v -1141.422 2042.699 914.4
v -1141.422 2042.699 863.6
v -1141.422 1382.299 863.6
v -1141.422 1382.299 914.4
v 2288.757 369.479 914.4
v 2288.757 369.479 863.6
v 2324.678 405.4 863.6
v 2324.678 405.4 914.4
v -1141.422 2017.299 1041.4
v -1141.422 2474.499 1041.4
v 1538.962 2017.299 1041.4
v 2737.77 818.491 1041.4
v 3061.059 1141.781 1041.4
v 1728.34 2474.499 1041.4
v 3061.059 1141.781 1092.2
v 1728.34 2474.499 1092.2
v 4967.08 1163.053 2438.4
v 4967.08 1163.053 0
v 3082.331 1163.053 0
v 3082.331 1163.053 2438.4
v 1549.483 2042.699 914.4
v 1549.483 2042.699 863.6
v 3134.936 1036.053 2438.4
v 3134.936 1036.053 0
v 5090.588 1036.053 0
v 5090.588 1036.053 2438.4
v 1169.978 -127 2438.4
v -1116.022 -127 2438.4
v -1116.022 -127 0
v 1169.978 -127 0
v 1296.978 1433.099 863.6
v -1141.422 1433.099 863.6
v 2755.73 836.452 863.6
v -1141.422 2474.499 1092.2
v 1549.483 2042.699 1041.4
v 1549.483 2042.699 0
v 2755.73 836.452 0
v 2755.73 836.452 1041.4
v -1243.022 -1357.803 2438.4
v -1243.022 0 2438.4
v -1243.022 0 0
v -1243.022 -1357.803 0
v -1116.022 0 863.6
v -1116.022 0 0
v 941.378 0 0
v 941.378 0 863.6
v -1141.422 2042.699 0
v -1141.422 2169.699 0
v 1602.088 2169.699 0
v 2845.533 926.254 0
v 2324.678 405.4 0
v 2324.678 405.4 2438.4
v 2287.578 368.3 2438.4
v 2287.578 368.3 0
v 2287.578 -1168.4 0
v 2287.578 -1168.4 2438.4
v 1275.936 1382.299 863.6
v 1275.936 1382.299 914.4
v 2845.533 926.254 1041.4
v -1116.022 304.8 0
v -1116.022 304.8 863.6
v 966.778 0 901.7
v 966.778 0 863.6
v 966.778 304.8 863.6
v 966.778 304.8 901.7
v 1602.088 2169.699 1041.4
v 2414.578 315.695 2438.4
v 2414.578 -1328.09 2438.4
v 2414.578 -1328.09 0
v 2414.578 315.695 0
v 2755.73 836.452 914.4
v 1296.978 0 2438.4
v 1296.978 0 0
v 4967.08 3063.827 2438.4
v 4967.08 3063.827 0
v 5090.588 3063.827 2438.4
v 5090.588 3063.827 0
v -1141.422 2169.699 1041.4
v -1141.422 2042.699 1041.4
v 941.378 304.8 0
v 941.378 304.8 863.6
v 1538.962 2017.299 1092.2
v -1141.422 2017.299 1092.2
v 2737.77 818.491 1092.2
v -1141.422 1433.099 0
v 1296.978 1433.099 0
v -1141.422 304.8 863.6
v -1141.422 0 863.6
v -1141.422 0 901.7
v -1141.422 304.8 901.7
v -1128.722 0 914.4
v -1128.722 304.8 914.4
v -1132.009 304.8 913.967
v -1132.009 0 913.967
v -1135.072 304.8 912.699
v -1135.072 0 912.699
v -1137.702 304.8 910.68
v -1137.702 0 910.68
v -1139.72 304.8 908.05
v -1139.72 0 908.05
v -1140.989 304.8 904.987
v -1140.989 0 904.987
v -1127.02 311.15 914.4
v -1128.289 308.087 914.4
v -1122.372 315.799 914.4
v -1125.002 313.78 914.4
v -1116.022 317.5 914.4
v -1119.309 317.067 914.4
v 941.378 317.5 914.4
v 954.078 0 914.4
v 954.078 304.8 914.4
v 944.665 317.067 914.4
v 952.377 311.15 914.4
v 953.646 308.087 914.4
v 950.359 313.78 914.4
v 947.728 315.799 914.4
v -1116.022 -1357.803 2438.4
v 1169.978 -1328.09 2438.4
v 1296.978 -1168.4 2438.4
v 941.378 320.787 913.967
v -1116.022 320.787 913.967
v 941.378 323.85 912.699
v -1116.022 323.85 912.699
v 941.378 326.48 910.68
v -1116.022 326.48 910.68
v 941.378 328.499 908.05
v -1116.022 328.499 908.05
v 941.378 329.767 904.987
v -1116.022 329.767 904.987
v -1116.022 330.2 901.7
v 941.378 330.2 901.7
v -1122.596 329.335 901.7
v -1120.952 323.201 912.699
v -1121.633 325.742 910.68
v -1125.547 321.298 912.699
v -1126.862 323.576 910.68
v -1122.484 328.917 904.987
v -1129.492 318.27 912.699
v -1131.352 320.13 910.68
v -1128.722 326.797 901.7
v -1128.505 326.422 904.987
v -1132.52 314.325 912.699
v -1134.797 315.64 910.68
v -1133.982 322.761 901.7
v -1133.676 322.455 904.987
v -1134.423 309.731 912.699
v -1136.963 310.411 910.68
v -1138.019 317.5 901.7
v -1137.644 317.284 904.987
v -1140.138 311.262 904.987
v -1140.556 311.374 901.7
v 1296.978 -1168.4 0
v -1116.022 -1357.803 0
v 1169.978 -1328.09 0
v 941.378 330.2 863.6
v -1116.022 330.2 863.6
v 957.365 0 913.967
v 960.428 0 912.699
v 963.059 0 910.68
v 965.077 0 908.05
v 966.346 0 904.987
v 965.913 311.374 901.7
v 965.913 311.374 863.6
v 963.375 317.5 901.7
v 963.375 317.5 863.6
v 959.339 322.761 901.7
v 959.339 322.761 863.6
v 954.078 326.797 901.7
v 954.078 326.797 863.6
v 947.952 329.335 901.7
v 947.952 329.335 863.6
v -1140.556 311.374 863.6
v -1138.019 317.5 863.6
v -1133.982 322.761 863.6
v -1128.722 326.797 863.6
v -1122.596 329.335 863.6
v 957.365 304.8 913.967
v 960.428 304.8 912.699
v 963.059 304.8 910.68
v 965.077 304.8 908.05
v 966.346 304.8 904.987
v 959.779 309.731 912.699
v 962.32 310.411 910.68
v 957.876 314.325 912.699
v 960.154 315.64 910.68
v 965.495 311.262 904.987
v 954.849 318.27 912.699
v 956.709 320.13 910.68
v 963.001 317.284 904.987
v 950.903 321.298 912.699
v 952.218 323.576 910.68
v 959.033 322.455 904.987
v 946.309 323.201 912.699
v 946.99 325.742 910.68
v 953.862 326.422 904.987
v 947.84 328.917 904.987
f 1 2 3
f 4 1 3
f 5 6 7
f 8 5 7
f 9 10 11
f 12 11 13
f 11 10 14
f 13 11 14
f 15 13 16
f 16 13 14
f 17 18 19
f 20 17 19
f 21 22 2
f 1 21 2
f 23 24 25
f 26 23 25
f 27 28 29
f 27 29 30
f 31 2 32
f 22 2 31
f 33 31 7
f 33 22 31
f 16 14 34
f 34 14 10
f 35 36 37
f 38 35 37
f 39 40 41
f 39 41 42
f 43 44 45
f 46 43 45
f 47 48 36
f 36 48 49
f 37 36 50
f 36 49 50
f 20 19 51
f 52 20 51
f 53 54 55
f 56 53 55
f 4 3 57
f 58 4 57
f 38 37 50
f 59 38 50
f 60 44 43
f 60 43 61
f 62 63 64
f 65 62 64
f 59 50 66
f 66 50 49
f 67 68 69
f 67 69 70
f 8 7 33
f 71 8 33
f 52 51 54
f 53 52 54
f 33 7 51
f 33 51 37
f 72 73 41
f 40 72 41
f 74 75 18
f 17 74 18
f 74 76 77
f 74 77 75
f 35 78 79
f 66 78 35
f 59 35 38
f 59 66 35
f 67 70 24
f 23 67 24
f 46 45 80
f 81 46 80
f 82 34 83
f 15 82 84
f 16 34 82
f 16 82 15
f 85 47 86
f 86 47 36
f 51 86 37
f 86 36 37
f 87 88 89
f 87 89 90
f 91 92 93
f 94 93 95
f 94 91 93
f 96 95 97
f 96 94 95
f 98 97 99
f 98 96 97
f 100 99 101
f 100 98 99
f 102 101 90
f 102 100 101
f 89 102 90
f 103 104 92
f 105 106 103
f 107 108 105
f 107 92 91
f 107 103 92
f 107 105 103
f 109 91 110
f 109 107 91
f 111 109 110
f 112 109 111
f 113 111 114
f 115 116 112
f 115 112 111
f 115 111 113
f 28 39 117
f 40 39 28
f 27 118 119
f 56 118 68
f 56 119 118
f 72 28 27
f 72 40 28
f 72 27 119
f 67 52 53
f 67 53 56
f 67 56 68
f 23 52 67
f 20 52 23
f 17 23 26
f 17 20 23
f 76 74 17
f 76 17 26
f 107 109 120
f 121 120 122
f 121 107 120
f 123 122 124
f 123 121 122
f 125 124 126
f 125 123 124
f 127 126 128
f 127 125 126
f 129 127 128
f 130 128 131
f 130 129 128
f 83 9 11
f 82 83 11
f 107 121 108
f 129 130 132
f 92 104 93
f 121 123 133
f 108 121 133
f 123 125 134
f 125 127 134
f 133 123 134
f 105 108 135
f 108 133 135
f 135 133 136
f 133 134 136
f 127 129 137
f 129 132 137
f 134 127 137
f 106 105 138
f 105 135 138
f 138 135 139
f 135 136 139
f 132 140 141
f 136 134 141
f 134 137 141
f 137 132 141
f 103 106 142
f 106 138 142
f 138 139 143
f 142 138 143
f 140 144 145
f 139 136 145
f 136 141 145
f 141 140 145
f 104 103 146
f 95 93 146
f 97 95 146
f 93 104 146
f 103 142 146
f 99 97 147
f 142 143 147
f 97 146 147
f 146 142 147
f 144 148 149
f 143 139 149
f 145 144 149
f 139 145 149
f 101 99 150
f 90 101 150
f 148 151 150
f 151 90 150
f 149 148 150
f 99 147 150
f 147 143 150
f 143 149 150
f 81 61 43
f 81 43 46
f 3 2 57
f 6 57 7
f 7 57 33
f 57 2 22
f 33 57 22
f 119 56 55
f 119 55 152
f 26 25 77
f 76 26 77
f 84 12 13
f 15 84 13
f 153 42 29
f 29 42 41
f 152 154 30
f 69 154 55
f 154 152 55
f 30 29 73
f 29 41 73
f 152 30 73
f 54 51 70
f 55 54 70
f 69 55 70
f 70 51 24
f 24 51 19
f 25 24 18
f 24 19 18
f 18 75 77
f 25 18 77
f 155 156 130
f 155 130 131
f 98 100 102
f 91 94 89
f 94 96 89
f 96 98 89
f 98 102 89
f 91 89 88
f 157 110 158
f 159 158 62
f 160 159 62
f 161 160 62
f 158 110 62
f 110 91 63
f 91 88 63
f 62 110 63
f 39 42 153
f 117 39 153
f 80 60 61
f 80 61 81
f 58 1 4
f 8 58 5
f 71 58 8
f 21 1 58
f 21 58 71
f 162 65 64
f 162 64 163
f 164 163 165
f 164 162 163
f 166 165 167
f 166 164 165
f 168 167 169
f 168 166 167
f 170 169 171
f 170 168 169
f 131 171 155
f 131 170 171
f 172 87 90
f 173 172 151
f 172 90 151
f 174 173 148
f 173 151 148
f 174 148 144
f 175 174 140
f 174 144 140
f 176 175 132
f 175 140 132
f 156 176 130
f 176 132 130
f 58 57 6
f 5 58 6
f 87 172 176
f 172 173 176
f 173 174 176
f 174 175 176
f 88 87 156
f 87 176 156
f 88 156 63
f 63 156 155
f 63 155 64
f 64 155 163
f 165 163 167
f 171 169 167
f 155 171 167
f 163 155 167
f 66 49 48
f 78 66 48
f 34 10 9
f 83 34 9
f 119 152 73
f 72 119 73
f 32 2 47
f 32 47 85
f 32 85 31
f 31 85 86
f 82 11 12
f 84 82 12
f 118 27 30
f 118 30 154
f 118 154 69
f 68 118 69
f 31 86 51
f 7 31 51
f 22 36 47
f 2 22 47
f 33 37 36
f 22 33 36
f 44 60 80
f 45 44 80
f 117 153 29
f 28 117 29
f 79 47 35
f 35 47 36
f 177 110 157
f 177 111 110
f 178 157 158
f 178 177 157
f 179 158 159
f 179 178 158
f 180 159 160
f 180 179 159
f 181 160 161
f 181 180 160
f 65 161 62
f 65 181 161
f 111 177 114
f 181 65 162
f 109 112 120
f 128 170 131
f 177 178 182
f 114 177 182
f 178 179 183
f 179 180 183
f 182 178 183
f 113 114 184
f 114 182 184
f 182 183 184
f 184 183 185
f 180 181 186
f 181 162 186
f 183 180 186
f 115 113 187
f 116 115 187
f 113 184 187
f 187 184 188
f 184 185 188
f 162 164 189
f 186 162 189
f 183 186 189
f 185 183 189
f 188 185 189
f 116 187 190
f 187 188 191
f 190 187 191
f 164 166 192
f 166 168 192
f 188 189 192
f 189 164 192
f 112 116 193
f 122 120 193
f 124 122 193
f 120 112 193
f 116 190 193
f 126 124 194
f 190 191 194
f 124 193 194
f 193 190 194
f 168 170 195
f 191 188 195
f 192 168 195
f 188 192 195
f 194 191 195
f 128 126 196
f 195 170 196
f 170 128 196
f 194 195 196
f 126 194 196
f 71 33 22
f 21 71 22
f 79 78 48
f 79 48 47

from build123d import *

# Parameters (mm, degrees)
F1_DEPTH = 863.6
F0_W     = 2057.4
F0_H     = 304.8
F2_DEPTH = 2438.4
F3_DEPTH = 1041.4
F5_DEPTH = 50.8
F6_W     = 2108.2
F6_H     = 330.2
F7_DEPTH = 50.8
F8_R     = 25.4
F9_R     = 12.7


with BuildPart() as f1:
    # F0 (on Top) → F1 (new body)
    with BuildSketch(Plane.XY):
        Polygon((1296.9782733917, 1433.0991125107), (2324.6778296471, 405.3995562553), (2755.7301234584, 836.4518500667), (1549.4828610144, 2042.6991125107), (-1141.4217266083, 2042.6991125107), (-1141.4217266083, 1433.0991125107), align=None)
    extrude(amount=F1_DEPTH)


with BuildPart() as f1b:
    # F0 (on Top) → F1, piece 2 (new body)
    with BuildSketch(Plane.XY):
        with Locations((-87.3217266083, 152.4)):
            Rectangle(F0_W, F0_H)
    extrude(amount=F1_DEPTH)


with BuildPart() as f2:
    # F0 (on Top) → F2 (new body)
    with BuildSketch(Plane.XY):
        Polygon((-1116.0217266083, 0), (-1243.0217266083, 0), (-1243.0217266083, -1357.8029119428), (-1116.0217266083, -1357.8029119428), (-1116.0217266083, -127), (1169.9782733917, -127), (1169.9782733917, -1328.09007782), (2414.5782733917, -1328.09007782), (2414.5782733917, 315.6948775786), (3134.9360625277, 1036.0526667146), (5090.587792672, 1036.0526667146), (5090.587792672, 3063.8273026744), (4967.0795944628, 3063.8273026744), (4967.0795944628, 1163.0526667146), (3082.3309401063, 1163.0526667146), (3061.0588315747, 1141.780558183), (2845.5326846691, 926.2544112774), (2755.7301234584, 836.4518500667), (2324.6778296471, 405.3995562553), (2287.5782733917, 368.3), (2287.5782733917, -1168.4), (1296.9782733917, -1168.4), (1296.9782733917, 0), (941.3782733917, 0), align=None)
    extrude(amount=F2_DEPTH)


with BuildPart() as f3:
    # F0 (on Top) → F3 (new body)
    with BuildSketch(Plane.XY):
        Polygon((1549.4828610144, 2042.6991125107), (2755.7301234584, 836.4518500667), (2845.5326846691, 926.2544112774), (1602.0879834357, 2169.6991125107), (-1141.4217266083, 2169.6991125107), (-1141.4217266083, 2042.6991125107), align=None)
    extrude(amount=F3_DEPTH)


with BuildPart() as f5:
    # F4 (on face) → F5 (new body)
    with BuildSketch(Plane.XY.offset(1041.4)):
        Polygon((1538.9618365301, 2017.2991125107), (2737.7696112162, 818.4913378245), (3061.0588315747, 1141.780558183), (1728.3402772471, 2474.4991125107), (-1141.4217266083, 2474.4991125107), (-1141.4217266083, 2017.2991125107), align=None)
    extrude(amount=F5_DEPTH)


with BuildPart() as f7:
    # F6 (on face) → F7 (new body)
    with BuildSketch(Plane.XY.offset(863.6)):
        with Locations((-87.3217266083, 165.1)):
            Rectangle(F6_W, F6_H)
    extrude(amount=F7_DEPTH)

    # F8
    f8_edges = [f7.edges().sort_by_distance(p)[0] for p in [
        (-1141.421727, 330.2, 889),
        (966.778273, 330.2, 889),
    ]]
    fillet(f8_edges, radius=F8_R)

    # F9
    f9_edges = [f7.edges().sort_by_distance(p)[0] for p in [
        (966.778273, 152.4, 914.4),
        (-87.321727, 330.2, 914.4),
    ]]
    fillet(f9_edges, radius=F9_R)


with BuildPart() as f7b:
    # F6 (on face) → F7, piece 2 (new body)
    with BuildSketch(Plane.XY.offset(863.6)):
        Polygon((2324.6778296471, 405.3995562553), (2755.7301234584, 836.4518500667), (1549.4828610144, 2042.6991125107), (-1141.4217266083, 2042.6991125107), (-1141.4217266083, 1433.0991125107), (1296.9782733917, 1433.0991125107), align=None)
        Polygon((2288.7568051628, 369.4785317711), (2324.6778296471, 405.3995562553), (1296.9782733917, 1433.0991125107), (-1141.4217266083, 1433.0991125107), (-1141.4217266083, 1382.2991125107), (1275.9362244232, 1382.2991125107), align=None)
    extrude(amount=F7_DEPTH)


solid = Compound([f1.part, f1b.part, f2.part, f3.part, f5.part, f7.part, f7b.part])
